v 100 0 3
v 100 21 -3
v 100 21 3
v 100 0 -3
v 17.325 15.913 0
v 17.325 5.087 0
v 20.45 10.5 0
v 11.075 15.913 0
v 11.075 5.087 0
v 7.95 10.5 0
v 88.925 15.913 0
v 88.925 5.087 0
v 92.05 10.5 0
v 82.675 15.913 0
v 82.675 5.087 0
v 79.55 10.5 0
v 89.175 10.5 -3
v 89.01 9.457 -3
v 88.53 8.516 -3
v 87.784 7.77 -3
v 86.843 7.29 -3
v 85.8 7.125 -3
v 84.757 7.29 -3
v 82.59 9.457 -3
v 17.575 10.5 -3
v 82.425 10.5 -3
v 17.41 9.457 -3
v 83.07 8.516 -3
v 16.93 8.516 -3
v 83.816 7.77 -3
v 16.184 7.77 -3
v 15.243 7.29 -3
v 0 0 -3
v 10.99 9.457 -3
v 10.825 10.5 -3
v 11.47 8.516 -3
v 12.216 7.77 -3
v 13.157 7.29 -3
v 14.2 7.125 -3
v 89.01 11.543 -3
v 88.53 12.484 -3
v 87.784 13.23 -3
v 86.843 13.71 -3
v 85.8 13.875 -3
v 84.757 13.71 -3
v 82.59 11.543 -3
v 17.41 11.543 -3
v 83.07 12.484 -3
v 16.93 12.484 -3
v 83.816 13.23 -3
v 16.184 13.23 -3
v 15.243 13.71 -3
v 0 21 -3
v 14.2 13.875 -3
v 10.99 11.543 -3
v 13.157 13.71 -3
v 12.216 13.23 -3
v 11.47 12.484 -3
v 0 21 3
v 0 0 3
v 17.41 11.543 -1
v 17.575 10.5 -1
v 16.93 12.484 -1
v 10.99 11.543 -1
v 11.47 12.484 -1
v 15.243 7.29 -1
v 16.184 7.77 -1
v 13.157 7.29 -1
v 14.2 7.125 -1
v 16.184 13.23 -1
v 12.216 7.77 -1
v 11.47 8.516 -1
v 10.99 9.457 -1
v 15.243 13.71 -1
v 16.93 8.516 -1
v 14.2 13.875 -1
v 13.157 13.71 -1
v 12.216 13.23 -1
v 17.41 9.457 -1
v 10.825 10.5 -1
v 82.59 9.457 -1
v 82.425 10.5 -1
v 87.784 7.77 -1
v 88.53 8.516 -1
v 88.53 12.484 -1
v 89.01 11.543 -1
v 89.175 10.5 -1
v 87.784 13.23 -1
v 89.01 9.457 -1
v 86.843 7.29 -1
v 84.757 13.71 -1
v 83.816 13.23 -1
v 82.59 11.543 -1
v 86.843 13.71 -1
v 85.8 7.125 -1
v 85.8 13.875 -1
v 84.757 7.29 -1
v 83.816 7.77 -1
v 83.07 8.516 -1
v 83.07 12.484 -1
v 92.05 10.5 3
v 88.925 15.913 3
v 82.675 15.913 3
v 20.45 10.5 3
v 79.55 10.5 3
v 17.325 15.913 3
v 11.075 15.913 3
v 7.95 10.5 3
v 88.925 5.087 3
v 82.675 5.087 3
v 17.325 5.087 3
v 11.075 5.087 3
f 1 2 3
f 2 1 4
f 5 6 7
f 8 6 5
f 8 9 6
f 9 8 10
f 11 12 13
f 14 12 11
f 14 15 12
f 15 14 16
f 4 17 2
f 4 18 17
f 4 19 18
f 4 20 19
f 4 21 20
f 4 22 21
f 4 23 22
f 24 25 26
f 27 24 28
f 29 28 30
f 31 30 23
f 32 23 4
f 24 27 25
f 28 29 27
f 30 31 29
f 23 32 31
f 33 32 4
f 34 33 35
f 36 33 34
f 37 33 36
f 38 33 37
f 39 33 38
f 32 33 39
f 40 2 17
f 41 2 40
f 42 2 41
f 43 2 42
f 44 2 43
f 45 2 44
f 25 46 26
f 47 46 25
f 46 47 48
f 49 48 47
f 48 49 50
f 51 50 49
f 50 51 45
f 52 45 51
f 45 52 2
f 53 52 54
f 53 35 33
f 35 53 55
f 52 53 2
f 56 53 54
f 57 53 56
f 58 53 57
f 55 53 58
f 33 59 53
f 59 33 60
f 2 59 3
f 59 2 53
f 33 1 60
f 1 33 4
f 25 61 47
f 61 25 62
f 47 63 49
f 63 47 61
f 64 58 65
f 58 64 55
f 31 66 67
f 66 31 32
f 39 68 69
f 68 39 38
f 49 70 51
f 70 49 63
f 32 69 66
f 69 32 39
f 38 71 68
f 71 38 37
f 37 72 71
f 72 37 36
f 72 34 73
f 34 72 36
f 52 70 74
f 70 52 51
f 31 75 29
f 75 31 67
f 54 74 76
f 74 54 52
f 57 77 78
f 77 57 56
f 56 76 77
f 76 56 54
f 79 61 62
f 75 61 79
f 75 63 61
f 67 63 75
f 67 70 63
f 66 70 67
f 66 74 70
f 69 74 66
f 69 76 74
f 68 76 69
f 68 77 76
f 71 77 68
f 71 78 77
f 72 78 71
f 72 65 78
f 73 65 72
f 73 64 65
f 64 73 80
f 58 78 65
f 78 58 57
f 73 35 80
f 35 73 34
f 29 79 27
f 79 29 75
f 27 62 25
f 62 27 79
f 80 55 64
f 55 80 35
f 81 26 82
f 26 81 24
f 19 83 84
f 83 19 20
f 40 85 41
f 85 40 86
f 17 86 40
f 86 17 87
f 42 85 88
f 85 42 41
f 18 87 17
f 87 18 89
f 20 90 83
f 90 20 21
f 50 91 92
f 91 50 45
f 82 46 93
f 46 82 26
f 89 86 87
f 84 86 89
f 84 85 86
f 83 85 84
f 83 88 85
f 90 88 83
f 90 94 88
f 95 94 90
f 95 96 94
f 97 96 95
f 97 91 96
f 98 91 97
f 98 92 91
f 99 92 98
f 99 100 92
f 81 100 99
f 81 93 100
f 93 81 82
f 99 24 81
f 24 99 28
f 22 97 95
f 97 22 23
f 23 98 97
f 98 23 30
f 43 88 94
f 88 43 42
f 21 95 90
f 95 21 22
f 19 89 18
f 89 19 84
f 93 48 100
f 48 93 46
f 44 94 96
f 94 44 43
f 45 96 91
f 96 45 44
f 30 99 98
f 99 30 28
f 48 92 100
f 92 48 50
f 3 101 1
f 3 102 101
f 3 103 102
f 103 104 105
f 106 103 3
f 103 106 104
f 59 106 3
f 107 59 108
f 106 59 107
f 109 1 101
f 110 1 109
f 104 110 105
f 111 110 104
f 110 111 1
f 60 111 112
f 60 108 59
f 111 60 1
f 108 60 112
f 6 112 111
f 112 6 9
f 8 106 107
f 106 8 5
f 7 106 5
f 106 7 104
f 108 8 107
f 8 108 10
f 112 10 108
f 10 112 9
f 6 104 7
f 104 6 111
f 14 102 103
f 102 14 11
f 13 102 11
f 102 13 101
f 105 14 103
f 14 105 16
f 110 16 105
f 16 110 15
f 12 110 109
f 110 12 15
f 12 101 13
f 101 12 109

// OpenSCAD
// windscreen bracket for R80RT
// this is normally a brass and two studs which 
// push out from outside the fairing to hold the lower 
// part of the screen on.

// this will print a holder for the inside
// as well as an outer plate to take the 10mm nuts.


// dimensions for inside piece i_
i_x = 100;
i_y=21;
i_z=3;

holes_apart=71.6;
hole_1x=(i_x/2) - (holes_apart/2);
hole_2x=(i_x/2) + (holes_apart/2);

bolt_r=(6.75/2);
bolt_head=12.5/2;

main();


module main(){
	back_plate_with_holes();
	//rotate([0,180,0]) front_plate_with_holes();
	
}

module back_plate_with_holes(){
	x1=hole_1x;
	x2=hole_2x;
	y=i_y/2;
	z=-(i_z+1)-2;
	difference(){
		back_plate(0,0,-3,i_z);
		bolt_shaft(x1,y,z,i_z+2);
		bolt_shaft(x2,y,z,i_z+2);		
	}
	difference(){
		back_plate(0,0,0,i_z);
		bolt_head(x1,y,z);
		bolt_head(x2,y,z);		
	}


}


module front_plate_with_holes(){
	x1=hole_1x;
	x2=hole_2x;
	y=i_y/2;
	z=-(i_z+1)-2;
	difference(){
			front_plate();
			bolt_shaft(x1,y,z-2, 20);
			bolt_shaft(x2,y,z-2, 20);
	}
}

module front_plate(){
	x1=hole_1x;
	x2=hole_2x;
	y=i_y/2;
	z=-(i_z+1)-2;
	
	back_plate(0,0,-3,i_z);		
	back_plate(0,0,0,i_z);
	proud_head(x1,y,z);
	proud_head(x2,y,z);		


}

module back_plate(x,y,z, thickness){

	color("red") translate([x,y,z]) cube([i_x,i_y,thickness]);
}

module bolt_shaft(x,y,z, h1){
	$fn=20;
	color("black") translate([x,y,z])	cylinder(h=h1, r=bolt_r ,center=false);
}

module bolt_head(x,y,z){
	$fn=6;
	translate([x,y,z])	cylinder(h=10, r=bolt_head ,center=false);
}

module proud_head(x,y,z){
	$fn=20;
	color("blue") translate([x,y,z])	cylinder(h=3, r=bolt_head ,center=false);
}
